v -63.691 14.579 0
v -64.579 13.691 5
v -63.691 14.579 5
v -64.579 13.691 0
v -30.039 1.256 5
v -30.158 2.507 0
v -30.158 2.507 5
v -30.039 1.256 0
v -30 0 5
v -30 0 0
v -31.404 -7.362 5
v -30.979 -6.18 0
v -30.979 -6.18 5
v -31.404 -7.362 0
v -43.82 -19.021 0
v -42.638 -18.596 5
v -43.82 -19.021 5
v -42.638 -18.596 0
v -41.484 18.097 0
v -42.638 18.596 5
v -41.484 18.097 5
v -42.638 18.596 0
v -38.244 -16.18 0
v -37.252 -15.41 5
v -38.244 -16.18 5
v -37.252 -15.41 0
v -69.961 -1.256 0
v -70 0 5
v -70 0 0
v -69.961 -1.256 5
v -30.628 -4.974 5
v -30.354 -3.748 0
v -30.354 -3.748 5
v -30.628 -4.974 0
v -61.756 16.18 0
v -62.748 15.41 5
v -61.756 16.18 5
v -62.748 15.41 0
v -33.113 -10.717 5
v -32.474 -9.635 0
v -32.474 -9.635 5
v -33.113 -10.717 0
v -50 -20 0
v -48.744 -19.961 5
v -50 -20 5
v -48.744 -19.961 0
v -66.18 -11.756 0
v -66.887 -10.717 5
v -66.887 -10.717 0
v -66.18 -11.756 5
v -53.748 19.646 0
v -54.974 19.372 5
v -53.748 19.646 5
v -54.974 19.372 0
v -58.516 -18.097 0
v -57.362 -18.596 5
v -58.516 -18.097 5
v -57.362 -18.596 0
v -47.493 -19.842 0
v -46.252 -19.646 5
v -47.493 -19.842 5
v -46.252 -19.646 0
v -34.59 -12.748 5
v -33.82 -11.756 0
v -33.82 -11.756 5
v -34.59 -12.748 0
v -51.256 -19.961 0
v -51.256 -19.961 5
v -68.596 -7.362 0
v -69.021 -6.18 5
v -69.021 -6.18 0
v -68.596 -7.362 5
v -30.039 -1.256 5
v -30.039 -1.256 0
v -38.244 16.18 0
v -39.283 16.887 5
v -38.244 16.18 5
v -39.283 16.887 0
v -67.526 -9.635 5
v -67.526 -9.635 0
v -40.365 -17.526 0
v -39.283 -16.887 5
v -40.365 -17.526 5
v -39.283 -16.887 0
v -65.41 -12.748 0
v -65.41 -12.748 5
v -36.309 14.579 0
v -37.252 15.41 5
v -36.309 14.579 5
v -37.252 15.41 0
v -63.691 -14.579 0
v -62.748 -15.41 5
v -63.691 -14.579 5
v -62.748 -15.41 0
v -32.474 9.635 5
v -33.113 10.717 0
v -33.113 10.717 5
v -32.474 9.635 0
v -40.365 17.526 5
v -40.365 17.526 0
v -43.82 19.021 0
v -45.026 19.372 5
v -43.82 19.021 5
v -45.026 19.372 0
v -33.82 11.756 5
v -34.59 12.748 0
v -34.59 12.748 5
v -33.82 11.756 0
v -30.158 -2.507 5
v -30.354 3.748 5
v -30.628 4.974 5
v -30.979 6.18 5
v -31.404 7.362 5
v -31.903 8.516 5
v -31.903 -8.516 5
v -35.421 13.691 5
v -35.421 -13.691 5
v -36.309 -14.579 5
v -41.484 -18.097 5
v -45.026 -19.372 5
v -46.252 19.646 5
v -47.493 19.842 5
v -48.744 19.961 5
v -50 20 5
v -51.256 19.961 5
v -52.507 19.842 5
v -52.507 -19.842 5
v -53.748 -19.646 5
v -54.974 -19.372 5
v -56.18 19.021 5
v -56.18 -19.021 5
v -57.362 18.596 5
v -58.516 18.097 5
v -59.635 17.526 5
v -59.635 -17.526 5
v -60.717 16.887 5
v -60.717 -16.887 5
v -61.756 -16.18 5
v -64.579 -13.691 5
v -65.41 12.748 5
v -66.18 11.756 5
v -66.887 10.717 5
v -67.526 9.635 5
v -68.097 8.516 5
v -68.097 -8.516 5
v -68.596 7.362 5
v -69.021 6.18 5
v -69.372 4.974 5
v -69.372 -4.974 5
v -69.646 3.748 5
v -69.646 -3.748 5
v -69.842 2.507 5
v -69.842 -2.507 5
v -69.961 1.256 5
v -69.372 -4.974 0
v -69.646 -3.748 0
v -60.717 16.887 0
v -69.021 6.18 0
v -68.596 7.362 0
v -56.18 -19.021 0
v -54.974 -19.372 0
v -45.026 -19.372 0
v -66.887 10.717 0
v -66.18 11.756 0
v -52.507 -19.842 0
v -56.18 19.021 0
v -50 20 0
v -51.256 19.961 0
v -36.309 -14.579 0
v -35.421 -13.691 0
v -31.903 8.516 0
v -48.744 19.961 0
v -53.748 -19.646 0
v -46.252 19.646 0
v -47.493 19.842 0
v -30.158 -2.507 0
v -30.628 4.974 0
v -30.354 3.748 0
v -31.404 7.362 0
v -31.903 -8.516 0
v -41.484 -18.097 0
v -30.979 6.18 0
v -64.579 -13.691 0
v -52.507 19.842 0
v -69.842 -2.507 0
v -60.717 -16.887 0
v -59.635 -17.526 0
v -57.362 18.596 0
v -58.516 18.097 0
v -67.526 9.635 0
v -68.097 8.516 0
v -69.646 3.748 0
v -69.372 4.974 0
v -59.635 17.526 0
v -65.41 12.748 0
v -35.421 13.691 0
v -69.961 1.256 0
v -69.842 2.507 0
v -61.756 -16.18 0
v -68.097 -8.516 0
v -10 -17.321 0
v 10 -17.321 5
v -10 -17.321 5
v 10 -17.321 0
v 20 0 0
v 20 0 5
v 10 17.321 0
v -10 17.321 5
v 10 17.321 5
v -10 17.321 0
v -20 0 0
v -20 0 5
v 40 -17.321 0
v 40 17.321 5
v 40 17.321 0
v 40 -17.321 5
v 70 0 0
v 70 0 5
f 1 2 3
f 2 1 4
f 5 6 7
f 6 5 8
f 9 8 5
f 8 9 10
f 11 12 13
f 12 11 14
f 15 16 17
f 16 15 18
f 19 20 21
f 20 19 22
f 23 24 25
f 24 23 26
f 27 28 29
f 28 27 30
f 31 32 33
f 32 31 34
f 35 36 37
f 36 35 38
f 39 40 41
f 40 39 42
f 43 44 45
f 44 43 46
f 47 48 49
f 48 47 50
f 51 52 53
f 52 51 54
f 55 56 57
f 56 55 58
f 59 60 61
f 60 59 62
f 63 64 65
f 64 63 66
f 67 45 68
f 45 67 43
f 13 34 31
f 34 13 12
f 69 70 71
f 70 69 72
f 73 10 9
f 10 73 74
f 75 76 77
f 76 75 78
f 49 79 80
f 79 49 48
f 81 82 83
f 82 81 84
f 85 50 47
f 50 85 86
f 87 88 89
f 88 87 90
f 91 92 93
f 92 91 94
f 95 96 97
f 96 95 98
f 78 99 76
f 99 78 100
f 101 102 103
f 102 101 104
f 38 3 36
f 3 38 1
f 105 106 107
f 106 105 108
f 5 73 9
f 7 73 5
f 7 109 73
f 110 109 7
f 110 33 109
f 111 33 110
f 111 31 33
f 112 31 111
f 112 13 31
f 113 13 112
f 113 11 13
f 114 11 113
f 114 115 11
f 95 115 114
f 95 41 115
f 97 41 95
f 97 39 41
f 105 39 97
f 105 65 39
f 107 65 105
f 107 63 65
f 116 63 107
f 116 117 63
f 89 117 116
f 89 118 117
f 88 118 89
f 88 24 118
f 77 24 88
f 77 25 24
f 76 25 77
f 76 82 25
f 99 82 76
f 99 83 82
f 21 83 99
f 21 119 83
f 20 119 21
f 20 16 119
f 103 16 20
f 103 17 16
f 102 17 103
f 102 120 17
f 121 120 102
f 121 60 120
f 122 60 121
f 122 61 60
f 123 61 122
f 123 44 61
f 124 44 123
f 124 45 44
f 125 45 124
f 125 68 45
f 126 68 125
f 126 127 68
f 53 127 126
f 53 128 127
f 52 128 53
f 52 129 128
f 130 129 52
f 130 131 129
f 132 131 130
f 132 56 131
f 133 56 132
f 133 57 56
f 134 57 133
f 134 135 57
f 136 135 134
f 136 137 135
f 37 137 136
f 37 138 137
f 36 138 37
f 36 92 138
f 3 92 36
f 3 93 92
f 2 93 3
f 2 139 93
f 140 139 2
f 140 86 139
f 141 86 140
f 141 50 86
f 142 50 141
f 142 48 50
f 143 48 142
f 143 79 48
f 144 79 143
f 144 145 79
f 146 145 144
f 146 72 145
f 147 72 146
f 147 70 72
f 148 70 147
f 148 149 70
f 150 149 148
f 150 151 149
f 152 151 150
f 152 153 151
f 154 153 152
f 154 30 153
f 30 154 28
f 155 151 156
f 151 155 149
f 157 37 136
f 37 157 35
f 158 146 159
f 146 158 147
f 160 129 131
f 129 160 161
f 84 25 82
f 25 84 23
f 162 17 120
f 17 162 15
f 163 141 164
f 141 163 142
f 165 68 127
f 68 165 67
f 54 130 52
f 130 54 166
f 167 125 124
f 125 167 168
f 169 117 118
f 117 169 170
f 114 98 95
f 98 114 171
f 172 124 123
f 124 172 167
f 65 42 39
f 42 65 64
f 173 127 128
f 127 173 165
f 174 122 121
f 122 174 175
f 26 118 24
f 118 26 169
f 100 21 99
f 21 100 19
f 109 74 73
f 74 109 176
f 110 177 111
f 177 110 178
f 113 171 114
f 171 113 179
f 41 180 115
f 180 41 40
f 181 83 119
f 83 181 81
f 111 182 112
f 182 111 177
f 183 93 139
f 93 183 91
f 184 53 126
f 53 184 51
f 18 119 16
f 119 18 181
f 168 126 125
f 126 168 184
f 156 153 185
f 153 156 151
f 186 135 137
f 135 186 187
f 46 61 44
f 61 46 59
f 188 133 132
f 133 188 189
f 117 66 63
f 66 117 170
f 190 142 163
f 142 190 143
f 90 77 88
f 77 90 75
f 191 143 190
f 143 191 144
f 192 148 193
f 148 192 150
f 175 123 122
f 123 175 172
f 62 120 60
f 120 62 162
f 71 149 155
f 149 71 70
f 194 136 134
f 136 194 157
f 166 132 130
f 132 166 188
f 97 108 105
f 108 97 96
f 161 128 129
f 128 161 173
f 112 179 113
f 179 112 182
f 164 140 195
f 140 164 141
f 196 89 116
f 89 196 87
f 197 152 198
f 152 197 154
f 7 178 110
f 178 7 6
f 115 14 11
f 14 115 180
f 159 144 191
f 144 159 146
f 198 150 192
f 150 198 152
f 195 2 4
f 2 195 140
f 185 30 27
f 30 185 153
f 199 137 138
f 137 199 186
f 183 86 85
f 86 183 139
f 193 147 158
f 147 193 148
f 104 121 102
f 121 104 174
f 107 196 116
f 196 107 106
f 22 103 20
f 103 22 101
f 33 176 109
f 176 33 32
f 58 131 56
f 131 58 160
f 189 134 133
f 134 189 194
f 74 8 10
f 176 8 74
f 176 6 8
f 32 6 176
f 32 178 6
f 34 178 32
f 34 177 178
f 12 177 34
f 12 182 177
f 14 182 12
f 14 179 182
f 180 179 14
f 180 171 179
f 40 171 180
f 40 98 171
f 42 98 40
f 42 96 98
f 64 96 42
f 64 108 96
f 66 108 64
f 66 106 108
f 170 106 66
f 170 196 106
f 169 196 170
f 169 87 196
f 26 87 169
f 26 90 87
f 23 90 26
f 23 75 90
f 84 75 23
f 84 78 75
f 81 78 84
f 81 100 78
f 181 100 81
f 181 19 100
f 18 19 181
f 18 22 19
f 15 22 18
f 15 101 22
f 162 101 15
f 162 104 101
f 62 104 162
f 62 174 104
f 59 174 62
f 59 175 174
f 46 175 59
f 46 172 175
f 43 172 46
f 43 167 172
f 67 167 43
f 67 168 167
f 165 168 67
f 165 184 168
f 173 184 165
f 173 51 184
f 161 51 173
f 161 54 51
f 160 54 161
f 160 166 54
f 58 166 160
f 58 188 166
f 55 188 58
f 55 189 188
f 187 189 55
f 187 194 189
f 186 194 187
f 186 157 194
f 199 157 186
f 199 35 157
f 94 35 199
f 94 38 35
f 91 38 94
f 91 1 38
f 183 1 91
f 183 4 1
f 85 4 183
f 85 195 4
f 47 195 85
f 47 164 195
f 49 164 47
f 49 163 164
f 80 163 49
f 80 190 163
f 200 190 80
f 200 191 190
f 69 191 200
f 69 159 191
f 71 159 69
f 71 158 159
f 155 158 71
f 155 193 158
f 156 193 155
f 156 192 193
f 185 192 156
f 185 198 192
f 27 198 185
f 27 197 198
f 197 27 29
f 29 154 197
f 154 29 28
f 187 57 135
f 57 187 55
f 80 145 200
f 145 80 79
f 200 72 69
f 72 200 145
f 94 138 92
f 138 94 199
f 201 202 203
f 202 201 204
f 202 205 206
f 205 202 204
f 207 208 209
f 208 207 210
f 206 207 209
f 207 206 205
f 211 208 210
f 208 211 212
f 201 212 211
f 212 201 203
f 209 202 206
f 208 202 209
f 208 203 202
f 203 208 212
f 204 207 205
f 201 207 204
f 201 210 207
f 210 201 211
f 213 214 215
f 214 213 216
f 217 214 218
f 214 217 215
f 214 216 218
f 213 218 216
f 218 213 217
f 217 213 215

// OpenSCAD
//-- Moneda
translate([-50,0,0])
cylinder(r=40/2,h=5,$fn=100);

//-- Hexagono
cylinder(r=40/2,h=5,$fn=6);

//-- Triangulo equilatero
translate([50,0,0])
cylinder(r=40/2,h=5,$fn=3);
